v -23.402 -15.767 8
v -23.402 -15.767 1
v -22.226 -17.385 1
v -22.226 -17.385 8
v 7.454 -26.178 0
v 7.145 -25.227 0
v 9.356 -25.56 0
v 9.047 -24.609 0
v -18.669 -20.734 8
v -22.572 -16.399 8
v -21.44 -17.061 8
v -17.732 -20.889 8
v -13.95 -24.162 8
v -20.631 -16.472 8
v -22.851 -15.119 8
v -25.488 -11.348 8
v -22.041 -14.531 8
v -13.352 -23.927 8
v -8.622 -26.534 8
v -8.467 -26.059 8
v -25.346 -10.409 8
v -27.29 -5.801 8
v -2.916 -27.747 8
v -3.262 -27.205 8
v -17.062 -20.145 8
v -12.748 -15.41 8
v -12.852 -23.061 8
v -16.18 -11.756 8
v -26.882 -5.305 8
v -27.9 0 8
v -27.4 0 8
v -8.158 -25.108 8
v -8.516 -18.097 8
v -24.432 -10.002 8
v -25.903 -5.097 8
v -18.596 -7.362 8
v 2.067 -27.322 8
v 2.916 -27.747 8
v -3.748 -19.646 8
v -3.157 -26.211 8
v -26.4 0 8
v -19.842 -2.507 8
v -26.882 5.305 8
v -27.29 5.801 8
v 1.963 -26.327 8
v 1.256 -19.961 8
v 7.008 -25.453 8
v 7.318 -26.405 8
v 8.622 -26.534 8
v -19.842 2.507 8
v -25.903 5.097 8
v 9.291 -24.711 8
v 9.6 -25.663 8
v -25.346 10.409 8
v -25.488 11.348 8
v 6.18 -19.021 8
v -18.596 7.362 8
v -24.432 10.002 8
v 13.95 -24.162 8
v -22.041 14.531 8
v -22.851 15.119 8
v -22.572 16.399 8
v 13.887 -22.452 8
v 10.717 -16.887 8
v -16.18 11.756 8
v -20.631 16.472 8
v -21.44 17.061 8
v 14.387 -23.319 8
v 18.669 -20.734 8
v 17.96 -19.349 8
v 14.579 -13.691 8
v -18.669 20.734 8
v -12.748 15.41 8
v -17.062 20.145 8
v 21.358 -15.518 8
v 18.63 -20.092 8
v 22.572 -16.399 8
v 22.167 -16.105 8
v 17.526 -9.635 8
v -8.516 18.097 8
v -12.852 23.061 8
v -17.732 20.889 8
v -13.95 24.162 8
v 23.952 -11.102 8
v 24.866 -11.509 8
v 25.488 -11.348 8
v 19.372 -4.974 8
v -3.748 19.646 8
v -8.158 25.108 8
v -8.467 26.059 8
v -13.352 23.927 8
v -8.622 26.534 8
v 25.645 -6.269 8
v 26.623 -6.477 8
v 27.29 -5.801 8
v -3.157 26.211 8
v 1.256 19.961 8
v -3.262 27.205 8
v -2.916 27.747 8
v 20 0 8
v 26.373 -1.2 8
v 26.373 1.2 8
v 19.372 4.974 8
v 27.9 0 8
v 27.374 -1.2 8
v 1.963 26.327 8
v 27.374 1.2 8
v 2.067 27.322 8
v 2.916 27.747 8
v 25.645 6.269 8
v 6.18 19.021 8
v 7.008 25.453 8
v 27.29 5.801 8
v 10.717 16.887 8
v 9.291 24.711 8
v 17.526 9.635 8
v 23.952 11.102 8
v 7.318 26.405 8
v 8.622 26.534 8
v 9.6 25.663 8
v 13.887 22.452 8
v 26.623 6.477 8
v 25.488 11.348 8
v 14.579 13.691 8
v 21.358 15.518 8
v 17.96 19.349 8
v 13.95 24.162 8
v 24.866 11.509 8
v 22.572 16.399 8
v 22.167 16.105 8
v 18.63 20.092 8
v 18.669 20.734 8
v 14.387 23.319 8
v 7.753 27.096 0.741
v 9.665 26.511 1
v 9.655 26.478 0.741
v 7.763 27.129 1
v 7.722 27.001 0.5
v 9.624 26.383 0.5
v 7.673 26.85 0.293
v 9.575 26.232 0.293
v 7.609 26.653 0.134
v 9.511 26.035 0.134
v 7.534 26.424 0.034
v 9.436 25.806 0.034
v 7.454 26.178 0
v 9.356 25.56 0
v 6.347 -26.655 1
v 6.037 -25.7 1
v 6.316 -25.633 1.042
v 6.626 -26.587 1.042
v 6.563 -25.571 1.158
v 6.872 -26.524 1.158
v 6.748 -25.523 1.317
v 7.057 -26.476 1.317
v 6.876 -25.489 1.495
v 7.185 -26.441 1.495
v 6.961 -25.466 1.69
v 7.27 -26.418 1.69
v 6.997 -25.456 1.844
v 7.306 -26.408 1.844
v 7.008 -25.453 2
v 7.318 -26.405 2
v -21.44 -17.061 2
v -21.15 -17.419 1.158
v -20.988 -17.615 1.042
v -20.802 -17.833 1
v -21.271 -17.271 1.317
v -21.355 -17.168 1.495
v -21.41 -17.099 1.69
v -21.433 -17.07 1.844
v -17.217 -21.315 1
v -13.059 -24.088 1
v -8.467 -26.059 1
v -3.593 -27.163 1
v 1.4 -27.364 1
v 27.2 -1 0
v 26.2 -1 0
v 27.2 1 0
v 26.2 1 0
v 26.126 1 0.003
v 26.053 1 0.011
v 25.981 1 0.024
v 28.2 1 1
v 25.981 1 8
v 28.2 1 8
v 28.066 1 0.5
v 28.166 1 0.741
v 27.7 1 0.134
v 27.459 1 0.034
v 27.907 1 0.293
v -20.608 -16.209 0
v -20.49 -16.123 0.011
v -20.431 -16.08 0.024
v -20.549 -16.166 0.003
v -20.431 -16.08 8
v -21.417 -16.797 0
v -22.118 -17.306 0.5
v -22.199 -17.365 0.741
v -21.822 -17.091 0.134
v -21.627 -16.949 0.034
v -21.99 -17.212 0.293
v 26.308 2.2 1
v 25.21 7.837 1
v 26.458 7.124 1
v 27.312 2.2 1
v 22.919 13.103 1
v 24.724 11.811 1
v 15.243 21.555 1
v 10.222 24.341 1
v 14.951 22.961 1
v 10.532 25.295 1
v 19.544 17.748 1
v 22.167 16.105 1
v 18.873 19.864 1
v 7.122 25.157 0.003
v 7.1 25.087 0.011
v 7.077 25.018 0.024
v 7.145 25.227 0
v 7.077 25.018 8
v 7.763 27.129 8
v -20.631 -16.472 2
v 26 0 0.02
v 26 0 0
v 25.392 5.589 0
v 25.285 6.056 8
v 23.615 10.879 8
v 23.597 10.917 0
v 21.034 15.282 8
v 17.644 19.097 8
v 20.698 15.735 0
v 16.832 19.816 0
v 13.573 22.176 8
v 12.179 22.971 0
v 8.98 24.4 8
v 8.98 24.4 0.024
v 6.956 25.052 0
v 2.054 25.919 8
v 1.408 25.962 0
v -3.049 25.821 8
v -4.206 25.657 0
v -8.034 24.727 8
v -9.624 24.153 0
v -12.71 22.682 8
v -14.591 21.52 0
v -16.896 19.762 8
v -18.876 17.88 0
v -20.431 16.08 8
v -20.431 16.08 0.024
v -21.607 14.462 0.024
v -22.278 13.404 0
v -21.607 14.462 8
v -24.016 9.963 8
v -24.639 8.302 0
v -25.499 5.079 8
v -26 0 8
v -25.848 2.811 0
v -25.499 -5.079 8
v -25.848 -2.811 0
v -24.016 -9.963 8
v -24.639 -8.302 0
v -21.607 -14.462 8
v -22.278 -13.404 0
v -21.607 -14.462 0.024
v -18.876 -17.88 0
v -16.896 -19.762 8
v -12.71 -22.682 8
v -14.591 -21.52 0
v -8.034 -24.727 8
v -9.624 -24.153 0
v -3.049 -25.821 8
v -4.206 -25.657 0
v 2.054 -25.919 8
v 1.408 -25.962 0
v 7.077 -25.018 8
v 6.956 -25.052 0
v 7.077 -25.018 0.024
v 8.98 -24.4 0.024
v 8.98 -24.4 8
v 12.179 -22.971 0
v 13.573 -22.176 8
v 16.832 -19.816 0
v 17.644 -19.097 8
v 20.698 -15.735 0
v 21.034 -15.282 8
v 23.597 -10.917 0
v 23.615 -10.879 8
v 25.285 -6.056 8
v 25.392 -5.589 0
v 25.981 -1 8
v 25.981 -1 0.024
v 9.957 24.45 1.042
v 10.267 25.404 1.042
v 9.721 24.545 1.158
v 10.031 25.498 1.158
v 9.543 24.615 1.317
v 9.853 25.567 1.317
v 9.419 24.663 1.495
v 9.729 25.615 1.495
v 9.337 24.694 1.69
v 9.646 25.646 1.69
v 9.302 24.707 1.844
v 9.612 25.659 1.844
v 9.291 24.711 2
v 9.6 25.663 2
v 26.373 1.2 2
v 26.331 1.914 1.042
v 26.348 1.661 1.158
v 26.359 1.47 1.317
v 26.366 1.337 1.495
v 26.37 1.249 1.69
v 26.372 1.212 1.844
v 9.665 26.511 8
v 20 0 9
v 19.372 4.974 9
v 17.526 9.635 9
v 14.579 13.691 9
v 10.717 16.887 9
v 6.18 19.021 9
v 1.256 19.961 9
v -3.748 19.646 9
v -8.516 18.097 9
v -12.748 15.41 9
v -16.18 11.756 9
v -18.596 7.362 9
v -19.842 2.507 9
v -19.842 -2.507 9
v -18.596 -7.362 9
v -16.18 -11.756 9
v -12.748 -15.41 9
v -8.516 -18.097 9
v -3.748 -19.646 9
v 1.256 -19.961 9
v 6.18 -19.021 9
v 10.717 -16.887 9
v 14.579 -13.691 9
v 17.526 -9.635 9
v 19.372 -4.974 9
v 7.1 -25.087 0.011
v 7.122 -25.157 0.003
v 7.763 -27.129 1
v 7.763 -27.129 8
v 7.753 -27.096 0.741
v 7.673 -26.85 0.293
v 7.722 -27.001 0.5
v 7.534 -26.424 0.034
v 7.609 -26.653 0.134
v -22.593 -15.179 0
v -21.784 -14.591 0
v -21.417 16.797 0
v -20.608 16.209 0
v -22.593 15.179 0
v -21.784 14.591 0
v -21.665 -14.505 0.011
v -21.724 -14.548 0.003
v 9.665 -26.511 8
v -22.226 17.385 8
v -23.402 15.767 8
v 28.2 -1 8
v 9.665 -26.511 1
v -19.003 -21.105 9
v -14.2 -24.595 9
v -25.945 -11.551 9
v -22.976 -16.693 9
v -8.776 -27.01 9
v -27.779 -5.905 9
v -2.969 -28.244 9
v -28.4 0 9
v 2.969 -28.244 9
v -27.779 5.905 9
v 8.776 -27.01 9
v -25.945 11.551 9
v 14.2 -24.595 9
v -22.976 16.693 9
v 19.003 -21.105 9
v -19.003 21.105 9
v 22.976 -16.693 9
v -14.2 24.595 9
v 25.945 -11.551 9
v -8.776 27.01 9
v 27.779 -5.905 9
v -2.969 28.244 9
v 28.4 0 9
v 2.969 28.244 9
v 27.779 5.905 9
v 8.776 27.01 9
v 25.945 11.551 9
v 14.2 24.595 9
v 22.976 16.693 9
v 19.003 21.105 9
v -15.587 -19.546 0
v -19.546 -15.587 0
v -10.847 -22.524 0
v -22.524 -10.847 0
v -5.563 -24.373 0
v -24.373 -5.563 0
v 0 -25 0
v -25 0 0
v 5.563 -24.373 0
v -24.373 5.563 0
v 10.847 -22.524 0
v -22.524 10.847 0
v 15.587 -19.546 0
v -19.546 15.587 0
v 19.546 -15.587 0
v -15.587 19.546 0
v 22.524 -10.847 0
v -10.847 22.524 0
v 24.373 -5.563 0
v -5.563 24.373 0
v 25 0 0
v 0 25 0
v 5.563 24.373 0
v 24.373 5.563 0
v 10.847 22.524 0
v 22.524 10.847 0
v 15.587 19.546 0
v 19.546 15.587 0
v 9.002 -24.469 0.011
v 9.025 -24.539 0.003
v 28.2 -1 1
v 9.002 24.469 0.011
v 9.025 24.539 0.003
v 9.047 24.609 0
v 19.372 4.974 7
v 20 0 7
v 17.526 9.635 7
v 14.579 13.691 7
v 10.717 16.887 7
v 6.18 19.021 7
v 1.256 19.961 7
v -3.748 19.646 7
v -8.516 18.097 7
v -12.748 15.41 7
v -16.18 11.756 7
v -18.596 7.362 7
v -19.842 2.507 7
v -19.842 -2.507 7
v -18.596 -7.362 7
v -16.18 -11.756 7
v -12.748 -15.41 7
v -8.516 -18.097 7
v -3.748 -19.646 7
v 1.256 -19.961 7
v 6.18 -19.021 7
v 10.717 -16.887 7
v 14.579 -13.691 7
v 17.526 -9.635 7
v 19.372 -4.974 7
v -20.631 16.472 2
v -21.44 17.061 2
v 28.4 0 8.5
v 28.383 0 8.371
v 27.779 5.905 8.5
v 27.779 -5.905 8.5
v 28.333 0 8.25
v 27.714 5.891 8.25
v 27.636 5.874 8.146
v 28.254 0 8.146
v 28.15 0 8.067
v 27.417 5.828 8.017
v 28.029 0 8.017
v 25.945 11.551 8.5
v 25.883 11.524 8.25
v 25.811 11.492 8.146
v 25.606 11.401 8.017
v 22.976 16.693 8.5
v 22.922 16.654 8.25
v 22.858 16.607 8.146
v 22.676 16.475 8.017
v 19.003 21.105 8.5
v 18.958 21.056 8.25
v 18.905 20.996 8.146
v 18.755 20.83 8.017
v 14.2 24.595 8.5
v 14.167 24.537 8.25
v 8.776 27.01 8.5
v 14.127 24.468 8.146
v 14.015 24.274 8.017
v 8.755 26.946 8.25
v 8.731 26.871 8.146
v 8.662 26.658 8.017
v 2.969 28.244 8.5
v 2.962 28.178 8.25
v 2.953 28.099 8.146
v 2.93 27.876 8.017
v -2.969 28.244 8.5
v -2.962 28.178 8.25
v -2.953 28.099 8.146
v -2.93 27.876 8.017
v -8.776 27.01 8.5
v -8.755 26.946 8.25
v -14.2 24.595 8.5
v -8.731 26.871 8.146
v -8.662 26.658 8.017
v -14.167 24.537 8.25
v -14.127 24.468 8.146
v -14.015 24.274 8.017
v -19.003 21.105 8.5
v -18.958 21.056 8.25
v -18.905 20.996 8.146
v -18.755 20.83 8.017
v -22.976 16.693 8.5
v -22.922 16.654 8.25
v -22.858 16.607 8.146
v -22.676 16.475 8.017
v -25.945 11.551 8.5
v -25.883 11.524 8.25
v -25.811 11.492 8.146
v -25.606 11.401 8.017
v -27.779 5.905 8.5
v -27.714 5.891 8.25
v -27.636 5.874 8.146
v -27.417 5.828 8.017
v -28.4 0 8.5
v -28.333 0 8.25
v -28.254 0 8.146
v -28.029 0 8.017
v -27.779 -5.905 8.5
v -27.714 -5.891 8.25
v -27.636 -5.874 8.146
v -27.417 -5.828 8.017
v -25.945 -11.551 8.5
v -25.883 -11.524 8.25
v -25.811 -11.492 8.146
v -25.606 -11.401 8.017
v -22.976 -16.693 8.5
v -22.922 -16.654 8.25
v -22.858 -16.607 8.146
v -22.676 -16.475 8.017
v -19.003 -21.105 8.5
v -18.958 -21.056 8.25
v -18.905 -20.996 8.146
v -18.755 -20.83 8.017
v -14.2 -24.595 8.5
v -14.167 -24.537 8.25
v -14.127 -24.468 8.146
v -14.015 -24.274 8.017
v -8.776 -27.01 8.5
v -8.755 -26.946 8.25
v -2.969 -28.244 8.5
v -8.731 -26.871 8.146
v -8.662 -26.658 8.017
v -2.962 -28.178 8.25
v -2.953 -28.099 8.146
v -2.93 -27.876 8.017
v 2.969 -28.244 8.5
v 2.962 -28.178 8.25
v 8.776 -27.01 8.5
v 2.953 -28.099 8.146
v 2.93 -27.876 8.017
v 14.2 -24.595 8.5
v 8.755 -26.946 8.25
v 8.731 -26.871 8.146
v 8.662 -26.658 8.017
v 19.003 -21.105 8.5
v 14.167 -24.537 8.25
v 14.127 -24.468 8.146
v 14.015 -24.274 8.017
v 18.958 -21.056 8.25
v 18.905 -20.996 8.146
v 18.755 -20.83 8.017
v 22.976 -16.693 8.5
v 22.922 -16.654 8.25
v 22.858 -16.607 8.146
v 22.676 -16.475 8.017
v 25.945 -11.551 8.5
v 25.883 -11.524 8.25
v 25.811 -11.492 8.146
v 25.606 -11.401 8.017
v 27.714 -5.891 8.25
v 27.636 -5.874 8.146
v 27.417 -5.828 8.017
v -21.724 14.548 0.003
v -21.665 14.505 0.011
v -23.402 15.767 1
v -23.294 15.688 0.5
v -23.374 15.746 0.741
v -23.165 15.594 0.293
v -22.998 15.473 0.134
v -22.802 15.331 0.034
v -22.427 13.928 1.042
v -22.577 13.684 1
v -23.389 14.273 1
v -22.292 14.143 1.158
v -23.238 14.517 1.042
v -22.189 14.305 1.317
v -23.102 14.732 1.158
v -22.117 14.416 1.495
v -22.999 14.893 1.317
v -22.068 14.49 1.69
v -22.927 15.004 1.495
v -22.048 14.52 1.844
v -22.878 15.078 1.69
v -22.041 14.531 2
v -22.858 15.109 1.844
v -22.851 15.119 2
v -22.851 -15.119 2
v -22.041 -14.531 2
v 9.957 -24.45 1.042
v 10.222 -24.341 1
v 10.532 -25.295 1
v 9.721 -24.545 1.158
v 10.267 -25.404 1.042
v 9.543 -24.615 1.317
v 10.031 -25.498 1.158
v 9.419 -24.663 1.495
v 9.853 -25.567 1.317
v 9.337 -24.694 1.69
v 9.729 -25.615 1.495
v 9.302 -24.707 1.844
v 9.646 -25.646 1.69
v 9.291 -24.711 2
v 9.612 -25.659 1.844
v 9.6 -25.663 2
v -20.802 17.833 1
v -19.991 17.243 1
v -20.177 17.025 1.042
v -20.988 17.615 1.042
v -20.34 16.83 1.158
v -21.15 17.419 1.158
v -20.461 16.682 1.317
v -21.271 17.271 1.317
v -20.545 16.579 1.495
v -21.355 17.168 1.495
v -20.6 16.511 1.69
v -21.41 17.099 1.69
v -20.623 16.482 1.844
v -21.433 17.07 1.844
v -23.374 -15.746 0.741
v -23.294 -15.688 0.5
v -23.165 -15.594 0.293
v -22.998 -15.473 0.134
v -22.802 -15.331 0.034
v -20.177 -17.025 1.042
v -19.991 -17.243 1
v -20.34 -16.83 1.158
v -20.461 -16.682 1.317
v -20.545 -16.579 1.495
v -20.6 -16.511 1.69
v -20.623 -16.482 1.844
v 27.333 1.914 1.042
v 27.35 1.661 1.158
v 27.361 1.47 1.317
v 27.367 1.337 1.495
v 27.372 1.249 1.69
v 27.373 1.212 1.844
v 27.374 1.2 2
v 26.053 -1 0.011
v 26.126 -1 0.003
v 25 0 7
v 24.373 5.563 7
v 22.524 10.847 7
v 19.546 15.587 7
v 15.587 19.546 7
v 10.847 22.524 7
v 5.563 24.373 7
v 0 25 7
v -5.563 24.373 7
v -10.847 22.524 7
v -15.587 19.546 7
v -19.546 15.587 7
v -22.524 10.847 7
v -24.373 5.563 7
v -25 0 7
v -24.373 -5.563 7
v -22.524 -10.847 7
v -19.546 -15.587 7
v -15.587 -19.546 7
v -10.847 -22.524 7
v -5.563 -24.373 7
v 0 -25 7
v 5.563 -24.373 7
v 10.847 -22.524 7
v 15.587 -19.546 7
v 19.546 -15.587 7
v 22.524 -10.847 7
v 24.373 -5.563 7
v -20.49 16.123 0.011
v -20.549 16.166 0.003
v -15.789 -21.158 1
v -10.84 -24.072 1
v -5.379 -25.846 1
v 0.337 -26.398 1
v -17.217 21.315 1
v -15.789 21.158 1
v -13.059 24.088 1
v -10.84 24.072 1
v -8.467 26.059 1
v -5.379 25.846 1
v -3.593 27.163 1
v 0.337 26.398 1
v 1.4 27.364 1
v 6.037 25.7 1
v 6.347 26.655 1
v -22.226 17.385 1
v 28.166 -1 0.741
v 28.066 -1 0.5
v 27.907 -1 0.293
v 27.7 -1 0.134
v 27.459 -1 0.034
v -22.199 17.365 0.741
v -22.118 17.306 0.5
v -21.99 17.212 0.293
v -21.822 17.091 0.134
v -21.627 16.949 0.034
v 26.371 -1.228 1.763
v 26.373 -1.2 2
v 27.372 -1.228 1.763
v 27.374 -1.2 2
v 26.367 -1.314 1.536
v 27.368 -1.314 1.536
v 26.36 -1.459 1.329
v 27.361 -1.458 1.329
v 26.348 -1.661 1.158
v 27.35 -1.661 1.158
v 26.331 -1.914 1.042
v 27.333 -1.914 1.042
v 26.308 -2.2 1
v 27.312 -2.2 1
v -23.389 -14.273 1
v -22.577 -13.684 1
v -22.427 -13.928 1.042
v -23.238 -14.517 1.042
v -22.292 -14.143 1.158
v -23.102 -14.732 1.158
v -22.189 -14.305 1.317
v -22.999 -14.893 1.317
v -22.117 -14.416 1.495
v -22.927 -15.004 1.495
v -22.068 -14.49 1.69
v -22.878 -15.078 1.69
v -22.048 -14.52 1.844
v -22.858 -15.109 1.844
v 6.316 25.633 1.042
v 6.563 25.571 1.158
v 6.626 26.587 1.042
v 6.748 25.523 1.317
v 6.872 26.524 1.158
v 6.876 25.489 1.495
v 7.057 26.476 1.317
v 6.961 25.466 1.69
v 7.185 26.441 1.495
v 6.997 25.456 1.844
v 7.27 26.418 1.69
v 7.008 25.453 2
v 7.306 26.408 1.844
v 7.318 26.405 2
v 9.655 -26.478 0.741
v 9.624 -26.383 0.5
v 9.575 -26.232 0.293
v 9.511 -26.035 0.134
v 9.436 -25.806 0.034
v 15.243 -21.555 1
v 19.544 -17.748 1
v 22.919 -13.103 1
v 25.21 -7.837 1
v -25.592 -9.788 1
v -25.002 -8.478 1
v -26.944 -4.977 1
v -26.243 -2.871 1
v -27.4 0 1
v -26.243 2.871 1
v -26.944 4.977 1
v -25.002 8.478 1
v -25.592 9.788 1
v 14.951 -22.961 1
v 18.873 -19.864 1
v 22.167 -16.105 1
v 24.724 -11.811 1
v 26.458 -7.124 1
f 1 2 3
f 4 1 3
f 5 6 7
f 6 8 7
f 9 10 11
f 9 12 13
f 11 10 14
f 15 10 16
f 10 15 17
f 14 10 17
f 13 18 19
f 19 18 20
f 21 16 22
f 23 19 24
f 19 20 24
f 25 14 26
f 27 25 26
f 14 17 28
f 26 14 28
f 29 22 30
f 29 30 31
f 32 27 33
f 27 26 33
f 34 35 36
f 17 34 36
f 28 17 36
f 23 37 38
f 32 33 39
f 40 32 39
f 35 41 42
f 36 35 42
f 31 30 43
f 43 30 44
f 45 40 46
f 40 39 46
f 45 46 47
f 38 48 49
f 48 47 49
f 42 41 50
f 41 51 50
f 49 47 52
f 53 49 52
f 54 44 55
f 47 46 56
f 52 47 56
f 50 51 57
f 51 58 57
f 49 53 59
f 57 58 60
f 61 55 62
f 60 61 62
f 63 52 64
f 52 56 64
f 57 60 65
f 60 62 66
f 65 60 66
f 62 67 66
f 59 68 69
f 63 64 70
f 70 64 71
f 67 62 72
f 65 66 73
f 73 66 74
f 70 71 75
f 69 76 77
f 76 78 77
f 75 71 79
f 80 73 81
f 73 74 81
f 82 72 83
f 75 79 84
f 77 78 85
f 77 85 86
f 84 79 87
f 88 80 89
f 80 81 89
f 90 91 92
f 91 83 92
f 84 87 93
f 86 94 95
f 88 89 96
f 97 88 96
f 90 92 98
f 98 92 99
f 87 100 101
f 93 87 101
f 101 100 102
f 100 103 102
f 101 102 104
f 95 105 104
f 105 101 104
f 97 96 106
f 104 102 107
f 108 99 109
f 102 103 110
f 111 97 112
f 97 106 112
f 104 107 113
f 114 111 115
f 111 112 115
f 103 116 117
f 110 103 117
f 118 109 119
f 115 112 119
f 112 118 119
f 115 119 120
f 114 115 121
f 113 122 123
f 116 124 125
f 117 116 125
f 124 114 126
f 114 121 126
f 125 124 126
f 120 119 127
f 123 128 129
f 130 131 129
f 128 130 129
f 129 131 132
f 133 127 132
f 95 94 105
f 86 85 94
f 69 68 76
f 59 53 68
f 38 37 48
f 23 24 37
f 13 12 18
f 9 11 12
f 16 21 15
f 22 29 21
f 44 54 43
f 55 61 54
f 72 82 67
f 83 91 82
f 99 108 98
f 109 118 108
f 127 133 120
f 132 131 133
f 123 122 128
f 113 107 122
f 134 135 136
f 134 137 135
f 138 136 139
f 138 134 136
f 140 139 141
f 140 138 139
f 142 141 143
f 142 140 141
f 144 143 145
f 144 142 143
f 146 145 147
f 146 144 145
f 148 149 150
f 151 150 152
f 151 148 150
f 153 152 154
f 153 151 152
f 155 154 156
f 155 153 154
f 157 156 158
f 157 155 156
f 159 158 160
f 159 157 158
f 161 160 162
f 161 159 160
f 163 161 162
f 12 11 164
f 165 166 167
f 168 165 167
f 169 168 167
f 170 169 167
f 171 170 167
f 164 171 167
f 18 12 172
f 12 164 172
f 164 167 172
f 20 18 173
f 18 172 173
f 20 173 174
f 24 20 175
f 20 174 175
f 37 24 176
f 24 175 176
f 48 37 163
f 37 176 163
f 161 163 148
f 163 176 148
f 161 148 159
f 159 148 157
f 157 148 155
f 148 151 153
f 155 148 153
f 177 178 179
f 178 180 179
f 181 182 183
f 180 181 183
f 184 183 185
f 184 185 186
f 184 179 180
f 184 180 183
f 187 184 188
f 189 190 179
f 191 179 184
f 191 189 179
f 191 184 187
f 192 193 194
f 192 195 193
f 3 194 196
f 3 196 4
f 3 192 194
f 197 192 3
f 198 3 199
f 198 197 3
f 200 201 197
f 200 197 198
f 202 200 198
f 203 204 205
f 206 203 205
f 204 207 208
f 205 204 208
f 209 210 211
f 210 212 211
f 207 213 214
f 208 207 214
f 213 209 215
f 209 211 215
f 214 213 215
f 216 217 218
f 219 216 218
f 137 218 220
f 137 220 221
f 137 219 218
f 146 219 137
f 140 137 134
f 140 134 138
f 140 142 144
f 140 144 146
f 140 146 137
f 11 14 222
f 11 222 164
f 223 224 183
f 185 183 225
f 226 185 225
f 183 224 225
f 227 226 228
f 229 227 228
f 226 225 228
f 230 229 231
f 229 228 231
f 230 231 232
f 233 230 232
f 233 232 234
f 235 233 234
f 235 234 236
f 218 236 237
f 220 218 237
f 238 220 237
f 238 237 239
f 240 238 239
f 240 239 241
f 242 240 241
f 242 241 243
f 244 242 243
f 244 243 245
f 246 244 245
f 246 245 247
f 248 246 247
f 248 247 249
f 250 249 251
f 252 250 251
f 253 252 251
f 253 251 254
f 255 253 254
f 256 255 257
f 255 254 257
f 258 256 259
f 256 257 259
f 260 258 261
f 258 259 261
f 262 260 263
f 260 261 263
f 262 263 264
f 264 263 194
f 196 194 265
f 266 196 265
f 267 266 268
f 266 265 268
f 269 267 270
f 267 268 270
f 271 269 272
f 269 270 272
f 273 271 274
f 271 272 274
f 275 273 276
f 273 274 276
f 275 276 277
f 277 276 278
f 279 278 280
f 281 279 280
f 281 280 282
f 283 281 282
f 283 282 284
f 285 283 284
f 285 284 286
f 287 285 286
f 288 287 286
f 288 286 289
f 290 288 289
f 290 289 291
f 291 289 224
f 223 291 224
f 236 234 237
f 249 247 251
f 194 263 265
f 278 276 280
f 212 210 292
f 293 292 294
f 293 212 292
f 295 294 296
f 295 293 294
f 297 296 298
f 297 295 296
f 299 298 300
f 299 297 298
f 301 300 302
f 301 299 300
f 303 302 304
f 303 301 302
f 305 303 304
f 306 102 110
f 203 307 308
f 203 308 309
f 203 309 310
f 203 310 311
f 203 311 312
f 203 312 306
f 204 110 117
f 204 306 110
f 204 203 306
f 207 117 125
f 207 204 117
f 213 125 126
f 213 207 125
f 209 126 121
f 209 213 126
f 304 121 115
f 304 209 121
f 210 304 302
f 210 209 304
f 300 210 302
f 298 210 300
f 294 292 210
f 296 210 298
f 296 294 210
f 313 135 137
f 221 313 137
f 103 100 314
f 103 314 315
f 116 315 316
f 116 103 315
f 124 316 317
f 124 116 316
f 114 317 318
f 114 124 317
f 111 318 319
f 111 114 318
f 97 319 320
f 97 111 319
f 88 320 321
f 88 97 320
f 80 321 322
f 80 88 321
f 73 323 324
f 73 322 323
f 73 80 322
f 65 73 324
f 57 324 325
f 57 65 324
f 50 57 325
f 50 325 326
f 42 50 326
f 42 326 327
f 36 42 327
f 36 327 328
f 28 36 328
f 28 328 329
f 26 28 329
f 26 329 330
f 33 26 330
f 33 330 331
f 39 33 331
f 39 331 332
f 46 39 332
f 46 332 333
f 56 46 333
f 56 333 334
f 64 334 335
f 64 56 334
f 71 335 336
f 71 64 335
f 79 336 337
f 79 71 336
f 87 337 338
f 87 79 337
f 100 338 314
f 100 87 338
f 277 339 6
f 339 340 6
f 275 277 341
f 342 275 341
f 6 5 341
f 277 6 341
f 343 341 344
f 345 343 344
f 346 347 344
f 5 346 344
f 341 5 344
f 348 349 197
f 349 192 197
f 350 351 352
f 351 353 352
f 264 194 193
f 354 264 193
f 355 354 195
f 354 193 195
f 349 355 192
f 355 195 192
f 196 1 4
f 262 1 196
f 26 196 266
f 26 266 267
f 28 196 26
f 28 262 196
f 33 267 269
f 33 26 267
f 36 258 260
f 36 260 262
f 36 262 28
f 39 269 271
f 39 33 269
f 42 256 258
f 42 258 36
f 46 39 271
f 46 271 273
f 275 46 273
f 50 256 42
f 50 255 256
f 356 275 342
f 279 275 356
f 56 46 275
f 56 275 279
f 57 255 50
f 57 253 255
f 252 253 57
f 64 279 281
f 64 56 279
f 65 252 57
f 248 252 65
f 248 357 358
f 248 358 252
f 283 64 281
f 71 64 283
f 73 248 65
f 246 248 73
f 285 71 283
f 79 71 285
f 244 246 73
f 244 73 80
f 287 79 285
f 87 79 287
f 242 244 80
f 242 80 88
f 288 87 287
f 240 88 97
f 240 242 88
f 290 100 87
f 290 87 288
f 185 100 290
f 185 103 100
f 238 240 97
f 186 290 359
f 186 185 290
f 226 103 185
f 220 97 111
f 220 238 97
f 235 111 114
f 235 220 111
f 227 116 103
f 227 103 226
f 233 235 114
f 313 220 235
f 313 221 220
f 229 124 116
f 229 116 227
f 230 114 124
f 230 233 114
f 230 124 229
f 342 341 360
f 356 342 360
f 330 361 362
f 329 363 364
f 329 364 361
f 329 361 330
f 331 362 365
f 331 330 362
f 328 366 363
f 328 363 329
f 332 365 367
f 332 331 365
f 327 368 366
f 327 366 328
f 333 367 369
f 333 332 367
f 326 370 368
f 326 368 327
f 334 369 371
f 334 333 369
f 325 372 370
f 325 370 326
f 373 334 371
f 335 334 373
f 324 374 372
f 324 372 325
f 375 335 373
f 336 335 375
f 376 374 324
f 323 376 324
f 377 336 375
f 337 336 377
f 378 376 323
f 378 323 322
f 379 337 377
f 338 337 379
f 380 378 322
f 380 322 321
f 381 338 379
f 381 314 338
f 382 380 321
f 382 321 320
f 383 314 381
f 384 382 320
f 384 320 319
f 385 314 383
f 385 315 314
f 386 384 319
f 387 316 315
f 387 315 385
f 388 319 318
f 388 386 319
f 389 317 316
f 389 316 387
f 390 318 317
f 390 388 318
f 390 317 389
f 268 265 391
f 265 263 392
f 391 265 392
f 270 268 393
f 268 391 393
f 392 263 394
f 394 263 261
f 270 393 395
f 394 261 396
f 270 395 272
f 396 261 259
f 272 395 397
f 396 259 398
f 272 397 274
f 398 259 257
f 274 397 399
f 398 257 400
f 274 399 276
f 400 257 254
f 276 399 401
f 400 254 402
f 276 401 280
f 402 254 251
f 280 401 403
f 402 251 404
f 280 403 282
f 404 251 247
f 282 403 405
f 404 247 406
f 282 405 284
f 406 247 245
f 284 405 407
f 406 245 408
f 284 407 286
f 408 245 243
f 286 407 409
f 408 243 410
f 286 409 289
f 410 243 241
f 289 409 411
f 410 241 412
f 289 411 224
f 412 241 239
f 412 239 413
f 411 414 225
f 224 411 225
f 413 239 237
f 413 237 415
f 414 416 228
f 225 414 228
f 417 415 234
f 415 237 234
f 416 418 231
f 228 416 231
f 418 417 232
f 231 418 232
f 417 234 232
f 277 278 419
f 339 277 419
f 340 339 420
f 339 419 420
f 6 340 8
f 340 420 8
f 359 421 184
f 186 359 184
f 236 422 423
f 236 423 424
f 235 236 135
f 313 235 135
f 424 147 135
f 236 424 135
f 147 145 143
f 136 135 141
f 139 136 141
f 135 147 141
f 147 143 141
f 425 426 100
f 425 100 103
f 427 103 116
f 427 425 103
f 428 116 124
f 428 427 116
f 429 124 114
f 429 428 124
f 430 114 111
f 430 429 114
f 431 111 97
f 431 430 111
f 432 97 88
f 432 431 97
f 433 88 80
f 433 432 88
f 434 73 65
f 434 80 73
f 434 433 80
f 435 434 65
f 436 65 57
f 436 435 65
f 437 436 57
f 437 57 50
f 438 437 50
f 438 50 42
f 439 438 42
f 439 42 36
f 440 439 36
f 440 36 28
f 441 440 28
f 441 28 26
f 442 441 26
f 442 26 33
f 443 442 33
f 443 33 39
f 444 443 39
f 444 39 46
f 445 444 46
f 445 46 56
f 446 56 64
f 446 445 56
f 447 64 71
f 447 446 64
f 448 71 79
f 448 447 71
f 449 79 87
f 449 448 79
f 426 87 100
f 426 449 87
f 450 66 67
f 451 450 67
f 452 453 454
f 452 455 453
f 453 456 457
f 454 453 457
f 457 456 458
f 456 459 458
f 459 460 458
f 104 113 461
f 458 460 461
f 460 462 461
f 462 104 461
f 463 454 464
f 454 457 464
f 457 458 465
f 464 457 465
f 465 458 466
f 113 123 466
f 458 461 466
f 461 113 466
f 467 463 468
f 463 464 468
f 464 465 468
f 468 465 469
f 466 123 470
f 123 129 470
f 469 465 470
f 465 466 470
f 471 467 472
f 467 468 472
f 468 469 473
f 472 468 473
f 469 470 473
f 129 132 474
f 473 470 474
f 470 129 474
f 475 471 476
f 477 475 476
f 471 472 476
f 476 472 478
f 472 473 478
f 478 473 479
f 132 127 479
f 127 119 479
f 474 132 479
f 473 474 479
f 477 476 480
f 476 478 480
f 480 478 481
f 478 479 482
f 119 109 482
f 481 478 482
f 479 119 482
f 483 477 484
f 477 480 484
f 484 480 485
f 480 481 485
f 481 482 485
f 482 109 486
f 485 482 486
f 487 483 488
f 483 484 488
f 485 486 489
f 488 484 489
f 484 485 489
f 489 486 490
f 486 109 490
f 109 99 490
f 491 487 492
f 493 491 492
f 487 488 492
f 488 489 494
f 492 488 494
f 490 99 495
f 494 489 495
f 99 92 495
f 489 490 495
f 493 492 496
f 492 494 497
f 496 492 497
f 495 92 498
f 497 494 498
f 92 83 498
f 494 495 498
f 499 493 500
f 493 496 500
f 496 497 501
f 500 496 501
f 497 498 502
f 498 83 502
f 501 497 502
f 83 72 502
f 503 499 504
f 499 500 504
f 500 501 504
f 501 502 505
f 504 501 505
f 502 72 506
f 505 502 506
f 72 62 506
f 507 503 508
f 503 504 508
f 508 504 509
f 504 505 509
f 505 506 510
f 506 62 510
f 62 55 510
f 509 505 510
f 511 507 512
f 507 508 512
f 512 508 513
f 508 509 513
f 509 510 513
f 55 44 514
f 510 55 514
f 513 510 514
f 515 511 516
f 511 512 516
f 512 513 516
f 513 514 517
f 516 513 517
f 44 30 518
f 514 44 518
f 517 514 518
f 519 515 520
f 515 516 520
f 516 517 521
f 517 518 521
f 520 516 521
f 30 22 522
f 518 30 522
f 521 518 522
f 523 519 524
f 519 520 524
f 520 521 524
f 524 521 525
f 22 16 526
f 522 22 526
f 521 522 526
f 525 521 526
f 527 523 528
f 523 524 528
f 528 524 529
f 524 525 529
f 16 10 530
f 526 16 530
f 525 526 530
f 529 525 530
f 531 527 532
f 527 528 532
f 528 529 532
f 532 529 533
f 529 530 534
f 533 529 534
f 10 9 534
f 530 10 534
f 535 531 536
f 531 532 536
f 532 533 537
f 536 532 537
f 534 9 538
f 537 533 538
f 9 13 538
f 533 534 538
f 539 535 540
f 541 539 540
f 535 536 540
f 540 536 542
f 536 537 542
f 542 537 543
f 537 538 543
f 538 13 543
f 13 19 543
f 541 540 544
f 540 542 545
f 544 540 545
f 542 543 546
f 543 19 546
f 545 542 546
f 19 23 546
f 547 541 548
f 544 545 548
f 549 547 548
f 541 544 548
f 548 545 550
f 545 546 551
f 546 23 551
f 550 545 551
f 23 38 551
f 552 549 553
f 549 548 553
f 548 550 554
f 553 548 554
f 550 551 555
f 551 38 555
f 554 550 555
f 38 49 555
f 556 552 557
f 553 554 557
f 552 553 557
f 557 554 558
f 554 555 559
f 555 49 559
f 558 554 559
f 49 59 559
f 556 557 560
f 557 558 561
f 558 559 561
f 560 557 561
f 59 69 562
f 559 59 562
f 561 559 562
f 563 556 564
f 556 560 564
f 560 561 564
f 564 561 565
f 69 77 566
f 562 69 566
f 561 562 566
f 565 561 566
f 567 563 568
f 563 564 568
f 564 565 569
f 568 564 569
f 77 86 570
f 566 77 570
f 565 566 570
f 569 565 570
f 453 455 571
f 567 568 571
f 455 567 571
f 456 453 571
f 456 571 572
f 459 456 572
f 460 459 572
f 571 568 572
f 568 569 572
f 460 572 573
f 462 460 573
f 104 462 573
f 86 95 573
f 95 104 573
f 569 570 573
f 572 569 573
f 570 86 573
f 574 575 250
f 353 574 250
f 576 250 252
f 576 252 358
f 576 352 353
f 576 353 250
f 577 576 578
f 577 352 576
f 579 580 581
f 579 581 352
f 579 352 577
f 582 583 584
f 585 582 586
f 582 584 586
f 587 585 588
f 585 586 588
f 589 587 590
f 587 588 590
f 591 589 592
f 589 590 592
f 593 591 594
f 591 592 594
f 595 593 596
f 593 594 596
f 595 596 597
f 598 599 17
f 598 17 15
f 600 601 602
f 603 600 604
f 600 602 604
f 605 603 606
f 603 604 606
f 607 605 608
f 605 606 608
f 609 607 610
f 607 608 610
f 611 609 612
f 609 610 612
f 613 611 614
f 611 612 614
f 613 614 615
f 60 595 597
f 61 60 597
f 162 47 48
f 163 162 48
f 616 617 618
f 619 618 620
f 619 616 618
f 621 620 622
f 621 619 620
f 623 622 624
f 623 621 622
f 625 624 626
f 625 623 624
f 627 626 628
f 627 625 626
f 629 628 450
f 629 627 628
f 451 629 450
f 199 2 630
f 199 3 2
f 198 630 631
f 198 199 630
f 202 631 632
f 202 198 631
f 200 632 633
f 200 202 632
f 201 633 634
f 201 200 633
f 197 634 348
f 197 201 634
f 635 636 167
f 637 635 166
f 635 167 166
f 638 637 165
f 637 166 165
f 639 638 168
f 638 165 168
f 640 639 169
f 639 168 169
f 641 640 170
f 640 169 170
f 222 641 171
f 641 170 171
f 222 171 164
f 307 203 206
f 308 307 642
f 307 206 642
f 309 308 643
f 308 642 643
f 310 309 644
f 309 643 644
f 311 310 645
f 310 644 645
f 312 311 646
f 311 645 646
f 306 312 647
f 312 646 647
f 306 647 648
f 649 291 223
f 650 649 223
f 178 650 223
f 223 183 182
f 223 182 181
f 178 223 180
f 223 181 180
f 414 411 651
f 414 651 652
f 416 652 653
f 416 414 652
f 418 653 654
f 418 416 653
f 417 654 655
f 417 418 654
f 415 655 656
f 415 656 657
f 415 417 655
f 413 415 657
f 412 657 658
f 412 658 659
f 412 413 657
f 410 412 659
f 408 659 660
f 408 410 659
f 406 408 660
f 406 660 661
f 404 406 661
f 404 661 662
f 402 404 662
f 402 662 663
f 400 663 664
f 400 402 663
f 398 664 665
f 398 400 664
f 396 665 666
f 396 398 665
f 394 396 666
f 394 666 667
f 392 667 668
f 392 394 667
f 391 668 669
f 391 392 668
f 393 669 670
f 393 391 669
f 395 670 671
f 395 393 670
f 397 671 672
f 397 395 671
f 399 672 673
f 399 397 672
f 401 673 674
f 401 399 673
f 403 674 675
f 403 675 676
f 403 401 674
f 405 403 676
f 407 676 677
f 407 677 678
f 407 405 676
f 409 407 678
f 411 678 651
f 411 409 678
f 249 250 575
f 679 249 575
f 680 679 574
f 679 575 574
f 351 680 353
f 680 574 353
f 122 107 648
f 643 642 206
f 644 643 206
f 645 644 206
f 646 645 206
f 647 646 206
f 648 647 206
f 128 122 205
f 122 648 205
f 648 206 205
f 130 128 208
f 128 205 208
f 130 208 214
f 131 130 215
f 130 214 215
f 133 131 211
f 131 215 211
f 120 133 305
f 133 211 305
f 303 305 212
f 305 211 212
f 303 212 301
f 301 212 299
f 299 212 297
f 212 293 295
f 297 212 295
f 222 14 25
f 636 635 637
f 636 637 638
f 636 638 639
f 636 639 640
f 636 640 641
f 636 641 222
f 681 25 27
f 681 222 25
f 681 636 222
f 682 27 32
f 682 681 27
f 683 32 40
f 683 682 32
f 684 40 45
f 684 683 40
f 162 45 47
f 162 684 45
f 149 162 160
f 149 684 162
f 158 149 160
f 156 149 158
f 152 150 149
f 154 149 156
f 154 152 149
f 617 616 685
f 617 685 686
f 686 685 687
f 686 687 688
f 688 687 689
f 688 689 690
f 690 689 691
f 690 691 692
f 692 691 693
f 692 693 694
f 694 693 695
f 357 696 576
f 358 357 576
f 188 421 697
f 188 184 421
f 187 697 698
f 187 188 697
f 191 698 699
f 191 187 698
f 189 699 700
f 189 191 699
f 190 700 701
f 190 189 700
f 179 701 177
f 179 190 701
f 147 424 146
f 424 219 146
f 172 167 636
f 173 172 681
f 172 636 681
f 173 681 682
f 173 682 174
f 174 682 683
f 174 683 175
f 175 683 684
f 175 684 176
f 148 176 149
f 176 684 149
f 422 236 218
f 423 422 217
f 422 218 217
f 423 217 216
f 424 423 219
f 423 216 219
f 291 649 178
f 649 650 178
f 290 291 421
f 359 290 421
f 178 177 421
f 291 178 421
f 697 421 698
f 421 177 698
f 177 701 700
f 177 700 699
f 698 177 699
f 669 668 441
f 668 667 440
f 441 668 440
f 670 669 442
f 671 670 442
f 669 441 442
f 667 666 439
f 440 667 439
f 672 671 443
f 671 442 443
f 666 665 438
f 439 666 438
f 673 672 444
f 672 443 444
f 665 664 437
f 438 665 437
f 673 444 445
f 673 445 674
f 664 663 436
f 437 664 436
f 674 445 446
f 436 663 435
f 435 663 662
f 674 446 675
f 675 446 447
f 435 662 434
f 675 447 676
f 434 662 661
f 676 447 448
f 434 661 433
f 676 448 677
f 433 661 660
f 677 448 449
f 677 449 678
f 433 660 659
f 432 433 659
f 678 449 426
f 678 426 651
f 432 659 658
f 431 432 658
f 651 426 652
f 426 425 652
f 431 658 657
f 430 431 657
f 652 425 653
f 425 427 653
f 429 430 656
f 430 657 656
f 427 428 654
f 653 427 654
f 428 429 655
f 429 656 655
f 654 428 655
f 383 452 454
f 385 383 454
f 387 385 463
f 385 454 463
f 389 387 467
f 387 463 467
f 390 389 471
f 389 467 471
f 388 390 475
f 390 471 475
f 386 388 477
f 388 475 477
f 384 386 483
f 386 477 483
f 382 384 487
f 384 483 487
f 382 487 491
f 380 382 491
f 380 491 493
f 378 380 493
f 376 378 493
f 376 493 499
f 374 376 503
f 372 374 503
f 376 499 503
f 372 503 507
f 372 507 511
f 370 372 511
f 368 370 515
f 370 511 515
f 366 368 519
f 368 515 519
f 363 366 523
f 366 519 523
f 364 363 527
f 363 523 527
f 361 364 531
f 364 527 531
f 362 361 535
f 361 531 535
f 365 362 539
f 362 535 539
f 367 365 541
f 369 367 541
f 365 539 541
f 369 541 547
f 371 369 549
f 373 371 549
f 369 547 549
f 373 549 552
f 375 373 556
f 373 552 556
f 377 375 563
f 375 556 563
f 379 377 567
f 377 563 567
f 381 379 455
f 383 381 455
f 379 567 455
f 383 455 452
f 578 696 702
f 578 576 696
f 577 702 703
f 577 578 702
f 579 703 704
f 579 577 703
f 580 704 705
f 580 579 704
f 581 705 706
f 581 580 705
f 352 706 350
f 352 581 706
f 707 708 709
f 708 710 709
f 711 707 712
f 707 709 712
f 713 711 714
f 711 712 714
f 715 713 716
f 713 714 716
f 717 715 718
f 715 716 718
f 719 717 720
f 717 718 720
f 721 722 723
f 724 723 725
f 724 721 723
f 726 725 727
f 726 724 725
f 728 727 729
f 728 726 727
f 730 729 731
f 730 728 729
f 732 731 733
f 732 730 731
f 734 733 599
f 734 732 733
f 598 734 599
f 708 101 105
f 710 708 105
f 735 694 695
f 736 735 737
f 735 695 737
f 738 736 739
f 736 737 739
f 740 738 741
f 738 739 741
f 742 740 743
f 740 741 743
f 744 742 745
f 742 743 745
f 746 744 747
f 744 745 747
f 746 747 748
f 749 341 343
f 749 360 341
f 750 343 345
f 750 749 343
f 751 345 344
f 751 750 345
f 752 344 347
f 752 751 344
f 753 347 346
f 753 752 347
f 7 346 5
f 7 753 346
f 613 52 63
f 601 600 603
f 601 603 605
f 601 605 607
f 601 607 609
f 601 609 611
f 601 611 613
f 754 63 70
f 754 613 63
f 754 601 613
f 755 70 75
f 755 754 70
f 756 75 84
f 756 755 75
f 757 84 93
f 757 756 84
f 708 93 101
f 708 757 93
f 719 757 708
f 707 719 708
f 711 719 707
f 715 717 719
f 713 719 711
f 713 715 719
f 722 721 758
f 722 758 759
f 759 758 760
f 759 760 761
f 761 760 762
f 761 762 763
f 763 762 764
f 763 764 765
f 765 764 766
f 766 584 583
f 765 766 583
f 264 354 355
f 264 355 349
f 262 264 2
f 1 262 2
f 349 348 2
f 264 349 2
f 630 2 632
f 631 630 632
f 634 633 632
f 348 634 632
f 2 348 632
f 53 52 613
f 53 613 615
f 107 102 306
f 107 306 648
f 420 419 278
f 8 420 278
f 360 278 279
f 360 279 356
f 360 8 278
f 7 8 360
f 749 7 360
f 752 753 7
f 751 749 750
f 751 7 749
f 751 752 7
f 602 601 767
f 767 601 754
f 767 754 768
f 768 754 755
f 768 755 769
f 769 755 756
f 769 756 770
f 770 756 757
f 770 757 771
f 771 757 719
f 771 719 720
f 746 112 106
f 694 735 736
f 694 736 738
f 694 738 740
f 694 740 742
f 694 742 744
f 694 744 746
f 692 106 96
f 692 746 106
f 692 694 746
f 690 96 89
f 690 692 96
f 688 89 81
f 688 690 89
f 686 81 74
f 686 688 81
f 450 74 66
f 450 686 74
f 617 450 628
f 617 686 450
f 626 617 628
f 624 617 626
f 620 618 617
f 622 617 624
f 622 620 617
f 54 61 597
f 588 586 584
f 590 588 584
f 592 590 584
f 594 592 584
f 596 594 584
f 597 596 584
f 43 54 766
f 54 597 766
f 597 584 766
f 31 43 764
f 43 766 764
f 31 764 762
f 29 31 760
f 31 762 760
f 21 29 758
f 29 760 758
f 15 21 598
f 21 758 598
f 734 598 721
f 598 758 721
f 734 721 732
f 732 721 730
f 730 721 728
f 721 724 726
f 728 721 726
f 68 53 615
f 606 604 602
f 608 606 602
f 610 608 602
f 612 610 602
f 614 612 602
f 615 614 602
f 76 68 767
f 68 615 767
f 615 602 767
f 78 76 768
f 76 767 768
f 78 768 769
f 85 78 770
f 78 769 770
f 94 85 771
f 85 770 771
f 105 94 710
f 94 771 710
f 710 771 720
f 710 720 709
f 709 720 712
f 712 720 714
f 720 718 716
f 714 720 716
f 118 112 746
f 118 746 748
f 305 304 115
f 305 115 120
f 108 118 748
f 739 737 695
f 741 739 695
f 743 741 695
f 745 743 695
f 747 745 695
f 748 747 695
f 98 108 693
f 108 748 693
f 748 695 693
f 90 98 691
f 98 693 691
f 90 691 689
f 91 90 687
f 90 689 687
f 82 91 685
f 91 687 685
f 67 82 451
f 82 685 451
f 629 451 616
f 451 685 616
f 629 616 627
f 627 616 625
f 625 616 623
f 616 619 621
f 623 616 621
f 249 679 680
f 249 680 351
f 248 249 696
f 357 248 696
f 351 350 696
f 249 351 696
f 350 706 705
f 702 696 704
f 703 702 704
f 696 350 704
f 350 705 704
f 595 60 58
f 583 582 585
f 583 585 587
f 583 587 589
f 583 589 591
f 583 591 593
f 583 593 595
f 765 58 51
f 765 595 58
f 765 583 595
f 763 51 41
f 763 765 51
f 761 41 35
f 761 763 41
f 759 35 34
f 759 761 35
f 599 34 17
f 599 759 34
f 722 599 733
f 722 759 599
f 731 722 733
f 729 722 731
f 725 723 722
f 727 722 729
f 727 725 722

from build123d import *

# Parameters (mm, degrees)
CYLINDER002_R     = 20
CYLINDER002_DEPTH = 20
CYLINDER_R        = 25
CYLINDER_DEPTH    = 7
BOX_W             = 3
BOX_H             = 2
BOX_DEPTH         = 8
FILLET_R          = 1
ARRAY_COUNT       = 5
CYLINDER001_R     = 26
CYLINDER001_DEPTH = 8
CYLINDER005_R     = 20
CYLINDER005_DEPTH = 20
BOX001_W          = 5
BOX001_H          = 2.4
BOX001_DEPTH      = 7
ARRAY001_COUNT    = 5
CYLINDER003_R     = 26.4
CYLINDER003_DEPTH = 7
CYLINDER006_R     = 28.4
CYLINDER006_DEPTH = 1
FILLET001_R       = 0.5
CYLINDER004_R     = 27.4
CYLINDER004_DEPTH = 8
FILLET002_R       = 1


with BuildPart() as lens_hole:
    # Cylinder002 → Cylinder002 (new body)
    with BuildSketch(Plane.XY):
        Circle(CYLINDER002_R)
    extrude(amount=CYLINDER002_DEPTH)


with BuildPart() as extract_fusion:
    # Cylinder → Cylinder (new body)
    with BuildSketch(Plane.XY):
        Circle(CYLINDER_R)
    extrude(amount=CYLINDER_DEPTH)

    # Fusion: union lens hole
    add(lens_hole.part)


with BuildPart() as tick_array:
    # Box → Box (new body)
    with BuildSketch(Plane(origin=(25.2, -1, 0), x_dir=(1, 0, 0), z_dir=(0, 0, 1))):
        with Locations((1.5, 1)):
            Rectangle(BOX_W, BOX_H)
    extrude(amount=BOX_DEPTH)

    # Fillet
    fillet_edges = [tick_array.edges().sort_by_distance(p)[0] for p in [
        (25.2, 0, 0),
        (28.2, 0, 0),
    ]]
    fillet(fillet_edges, radius=FILLET_R)

    # Array: tick array ×5 about axis
    array_axis = Axis((0, 0, 0), (0, 0, 1))


with BuildPart() as tick_array_1:
    add(tick_array.part)
    for i in range(1, ARRAY_COUNT):
        add(tick_array.part.rotate(array_axis, i * 360 / ARRAY_COUNT))


with BuildPart() as border_cut:
    # Cylinder001 → Cylinder001 (new body)
    with BuildSketch(Plane.XY):
        Circle(CYLINDER001_R)
    extrude(amount=CYLINDER001_DEPTH)

    # Fusion002: union tick array
    add(tick_array_1.part)

    # Cut: cut extract fusion
    add(extract_fusion.part, mode=Mode.SUBTRACT)


with BuildPart() as lens_hole001:
    # Cylinder005 → Cylinder005 (new body)
    with BuildSketch(Plane.XY):
        Circle(CYLINDER005_R)
    extrude(amount=CYLINDER005_DEPTH)


with BuildPart() as tick_array001:
    # Box001 → Box001 (new body)
    with BuildSketch(Plane(origin=(25, -1.2, 0), x_dir=(1, 0, 0), z_dir=(0, 0, 1))):
        with Locations((2.5, 1.2)):
            Rectangle(BOX001_W, BOX001_H)
    extrude(amount=BOX001_DEPTH)

    # Array001: tick array001 ×5 about axis
    array001_axis = Axis((0, 0, 0), (0, 0, 1))


with BuildPart() as tick_array001_1:
    add(tick_array001.part)
    for i in range(1, ARRAY001_COUNT):
        add(tick_array001.part.rotate(array001_axis, i * 360 / ARRAY001_COUNT))


with BuildPart() as extract_fusion001:
    # Cylinder003 → Cylinder003 (new body)
    with BuildSketch(Plane.XY):
        Circle(CYLINDER003_R)
    extrude(amount=CYLINDER003_DEPTH)

    # Fusion001: union lens hole001, tick array001
    add(lens_hole001.part)
    add(tick_array001_1.part)


with BuildPart() as disk_fillet:
    # Cylinder006 → Cylinder006 (new body)
    with BuildSketch(Plane.XY.offset(7)):
        Circle(CYLINDER006_R)
    extrude(amount=CYLINDER006_DEPTH)

    # Fillet001
    fillet001_edges = [disk_fillet.edges().sort_by_distance(p)[0] for p in [
        (-28.4, 0, 7),
    ]]
    fillet(fillet001_edges, radius=FILLET001_R)


with BuildPart() as cover_fillet:
    # Cylinder004 → Cylinder004 (new body)
    with BuildSketch(Plane.XY):
        Circle(CYLINDER004_R)
    extrude(amount=CYLINDER004_DEPTH)

    # Fusion003: union disk fillet
    add(disk_fillet.part)

    # Cut001: cut extract fusion001
    add(extract_fusion001.part, mode=Mode.SUBTRACT)


with BuildPart() as cover_fillet_1:
    # Cut001 placement: moved
    add(cover_fillet.part.moved(Location((0, 0, 1))))

    # Fillet002
    fillet002_edges = [cover_fillet_1.edges().sort_by_distance(p)[0] for p in [
        (26.873212, -1.2, 1),
        (9.445547, -25.187123, 1),
        (7.163011, -25.928763, 1),
        (-21.035543, -16.766498, 1),
        (-22.446227, -14.824857, 1),
        (-22.446227, 14.824857, 1),
        (-21.035543, 16.766498, 1),
        (7.163011, 25.928763, 1),
        (9.445547, 25.187123, 1),
        (26.873212, 1.2, 1),
    ]]
    fillet(fillet002_edges, radius=FILLET002_R)


solid = Compound([border_cut.part, cover_fillet_1.part])
